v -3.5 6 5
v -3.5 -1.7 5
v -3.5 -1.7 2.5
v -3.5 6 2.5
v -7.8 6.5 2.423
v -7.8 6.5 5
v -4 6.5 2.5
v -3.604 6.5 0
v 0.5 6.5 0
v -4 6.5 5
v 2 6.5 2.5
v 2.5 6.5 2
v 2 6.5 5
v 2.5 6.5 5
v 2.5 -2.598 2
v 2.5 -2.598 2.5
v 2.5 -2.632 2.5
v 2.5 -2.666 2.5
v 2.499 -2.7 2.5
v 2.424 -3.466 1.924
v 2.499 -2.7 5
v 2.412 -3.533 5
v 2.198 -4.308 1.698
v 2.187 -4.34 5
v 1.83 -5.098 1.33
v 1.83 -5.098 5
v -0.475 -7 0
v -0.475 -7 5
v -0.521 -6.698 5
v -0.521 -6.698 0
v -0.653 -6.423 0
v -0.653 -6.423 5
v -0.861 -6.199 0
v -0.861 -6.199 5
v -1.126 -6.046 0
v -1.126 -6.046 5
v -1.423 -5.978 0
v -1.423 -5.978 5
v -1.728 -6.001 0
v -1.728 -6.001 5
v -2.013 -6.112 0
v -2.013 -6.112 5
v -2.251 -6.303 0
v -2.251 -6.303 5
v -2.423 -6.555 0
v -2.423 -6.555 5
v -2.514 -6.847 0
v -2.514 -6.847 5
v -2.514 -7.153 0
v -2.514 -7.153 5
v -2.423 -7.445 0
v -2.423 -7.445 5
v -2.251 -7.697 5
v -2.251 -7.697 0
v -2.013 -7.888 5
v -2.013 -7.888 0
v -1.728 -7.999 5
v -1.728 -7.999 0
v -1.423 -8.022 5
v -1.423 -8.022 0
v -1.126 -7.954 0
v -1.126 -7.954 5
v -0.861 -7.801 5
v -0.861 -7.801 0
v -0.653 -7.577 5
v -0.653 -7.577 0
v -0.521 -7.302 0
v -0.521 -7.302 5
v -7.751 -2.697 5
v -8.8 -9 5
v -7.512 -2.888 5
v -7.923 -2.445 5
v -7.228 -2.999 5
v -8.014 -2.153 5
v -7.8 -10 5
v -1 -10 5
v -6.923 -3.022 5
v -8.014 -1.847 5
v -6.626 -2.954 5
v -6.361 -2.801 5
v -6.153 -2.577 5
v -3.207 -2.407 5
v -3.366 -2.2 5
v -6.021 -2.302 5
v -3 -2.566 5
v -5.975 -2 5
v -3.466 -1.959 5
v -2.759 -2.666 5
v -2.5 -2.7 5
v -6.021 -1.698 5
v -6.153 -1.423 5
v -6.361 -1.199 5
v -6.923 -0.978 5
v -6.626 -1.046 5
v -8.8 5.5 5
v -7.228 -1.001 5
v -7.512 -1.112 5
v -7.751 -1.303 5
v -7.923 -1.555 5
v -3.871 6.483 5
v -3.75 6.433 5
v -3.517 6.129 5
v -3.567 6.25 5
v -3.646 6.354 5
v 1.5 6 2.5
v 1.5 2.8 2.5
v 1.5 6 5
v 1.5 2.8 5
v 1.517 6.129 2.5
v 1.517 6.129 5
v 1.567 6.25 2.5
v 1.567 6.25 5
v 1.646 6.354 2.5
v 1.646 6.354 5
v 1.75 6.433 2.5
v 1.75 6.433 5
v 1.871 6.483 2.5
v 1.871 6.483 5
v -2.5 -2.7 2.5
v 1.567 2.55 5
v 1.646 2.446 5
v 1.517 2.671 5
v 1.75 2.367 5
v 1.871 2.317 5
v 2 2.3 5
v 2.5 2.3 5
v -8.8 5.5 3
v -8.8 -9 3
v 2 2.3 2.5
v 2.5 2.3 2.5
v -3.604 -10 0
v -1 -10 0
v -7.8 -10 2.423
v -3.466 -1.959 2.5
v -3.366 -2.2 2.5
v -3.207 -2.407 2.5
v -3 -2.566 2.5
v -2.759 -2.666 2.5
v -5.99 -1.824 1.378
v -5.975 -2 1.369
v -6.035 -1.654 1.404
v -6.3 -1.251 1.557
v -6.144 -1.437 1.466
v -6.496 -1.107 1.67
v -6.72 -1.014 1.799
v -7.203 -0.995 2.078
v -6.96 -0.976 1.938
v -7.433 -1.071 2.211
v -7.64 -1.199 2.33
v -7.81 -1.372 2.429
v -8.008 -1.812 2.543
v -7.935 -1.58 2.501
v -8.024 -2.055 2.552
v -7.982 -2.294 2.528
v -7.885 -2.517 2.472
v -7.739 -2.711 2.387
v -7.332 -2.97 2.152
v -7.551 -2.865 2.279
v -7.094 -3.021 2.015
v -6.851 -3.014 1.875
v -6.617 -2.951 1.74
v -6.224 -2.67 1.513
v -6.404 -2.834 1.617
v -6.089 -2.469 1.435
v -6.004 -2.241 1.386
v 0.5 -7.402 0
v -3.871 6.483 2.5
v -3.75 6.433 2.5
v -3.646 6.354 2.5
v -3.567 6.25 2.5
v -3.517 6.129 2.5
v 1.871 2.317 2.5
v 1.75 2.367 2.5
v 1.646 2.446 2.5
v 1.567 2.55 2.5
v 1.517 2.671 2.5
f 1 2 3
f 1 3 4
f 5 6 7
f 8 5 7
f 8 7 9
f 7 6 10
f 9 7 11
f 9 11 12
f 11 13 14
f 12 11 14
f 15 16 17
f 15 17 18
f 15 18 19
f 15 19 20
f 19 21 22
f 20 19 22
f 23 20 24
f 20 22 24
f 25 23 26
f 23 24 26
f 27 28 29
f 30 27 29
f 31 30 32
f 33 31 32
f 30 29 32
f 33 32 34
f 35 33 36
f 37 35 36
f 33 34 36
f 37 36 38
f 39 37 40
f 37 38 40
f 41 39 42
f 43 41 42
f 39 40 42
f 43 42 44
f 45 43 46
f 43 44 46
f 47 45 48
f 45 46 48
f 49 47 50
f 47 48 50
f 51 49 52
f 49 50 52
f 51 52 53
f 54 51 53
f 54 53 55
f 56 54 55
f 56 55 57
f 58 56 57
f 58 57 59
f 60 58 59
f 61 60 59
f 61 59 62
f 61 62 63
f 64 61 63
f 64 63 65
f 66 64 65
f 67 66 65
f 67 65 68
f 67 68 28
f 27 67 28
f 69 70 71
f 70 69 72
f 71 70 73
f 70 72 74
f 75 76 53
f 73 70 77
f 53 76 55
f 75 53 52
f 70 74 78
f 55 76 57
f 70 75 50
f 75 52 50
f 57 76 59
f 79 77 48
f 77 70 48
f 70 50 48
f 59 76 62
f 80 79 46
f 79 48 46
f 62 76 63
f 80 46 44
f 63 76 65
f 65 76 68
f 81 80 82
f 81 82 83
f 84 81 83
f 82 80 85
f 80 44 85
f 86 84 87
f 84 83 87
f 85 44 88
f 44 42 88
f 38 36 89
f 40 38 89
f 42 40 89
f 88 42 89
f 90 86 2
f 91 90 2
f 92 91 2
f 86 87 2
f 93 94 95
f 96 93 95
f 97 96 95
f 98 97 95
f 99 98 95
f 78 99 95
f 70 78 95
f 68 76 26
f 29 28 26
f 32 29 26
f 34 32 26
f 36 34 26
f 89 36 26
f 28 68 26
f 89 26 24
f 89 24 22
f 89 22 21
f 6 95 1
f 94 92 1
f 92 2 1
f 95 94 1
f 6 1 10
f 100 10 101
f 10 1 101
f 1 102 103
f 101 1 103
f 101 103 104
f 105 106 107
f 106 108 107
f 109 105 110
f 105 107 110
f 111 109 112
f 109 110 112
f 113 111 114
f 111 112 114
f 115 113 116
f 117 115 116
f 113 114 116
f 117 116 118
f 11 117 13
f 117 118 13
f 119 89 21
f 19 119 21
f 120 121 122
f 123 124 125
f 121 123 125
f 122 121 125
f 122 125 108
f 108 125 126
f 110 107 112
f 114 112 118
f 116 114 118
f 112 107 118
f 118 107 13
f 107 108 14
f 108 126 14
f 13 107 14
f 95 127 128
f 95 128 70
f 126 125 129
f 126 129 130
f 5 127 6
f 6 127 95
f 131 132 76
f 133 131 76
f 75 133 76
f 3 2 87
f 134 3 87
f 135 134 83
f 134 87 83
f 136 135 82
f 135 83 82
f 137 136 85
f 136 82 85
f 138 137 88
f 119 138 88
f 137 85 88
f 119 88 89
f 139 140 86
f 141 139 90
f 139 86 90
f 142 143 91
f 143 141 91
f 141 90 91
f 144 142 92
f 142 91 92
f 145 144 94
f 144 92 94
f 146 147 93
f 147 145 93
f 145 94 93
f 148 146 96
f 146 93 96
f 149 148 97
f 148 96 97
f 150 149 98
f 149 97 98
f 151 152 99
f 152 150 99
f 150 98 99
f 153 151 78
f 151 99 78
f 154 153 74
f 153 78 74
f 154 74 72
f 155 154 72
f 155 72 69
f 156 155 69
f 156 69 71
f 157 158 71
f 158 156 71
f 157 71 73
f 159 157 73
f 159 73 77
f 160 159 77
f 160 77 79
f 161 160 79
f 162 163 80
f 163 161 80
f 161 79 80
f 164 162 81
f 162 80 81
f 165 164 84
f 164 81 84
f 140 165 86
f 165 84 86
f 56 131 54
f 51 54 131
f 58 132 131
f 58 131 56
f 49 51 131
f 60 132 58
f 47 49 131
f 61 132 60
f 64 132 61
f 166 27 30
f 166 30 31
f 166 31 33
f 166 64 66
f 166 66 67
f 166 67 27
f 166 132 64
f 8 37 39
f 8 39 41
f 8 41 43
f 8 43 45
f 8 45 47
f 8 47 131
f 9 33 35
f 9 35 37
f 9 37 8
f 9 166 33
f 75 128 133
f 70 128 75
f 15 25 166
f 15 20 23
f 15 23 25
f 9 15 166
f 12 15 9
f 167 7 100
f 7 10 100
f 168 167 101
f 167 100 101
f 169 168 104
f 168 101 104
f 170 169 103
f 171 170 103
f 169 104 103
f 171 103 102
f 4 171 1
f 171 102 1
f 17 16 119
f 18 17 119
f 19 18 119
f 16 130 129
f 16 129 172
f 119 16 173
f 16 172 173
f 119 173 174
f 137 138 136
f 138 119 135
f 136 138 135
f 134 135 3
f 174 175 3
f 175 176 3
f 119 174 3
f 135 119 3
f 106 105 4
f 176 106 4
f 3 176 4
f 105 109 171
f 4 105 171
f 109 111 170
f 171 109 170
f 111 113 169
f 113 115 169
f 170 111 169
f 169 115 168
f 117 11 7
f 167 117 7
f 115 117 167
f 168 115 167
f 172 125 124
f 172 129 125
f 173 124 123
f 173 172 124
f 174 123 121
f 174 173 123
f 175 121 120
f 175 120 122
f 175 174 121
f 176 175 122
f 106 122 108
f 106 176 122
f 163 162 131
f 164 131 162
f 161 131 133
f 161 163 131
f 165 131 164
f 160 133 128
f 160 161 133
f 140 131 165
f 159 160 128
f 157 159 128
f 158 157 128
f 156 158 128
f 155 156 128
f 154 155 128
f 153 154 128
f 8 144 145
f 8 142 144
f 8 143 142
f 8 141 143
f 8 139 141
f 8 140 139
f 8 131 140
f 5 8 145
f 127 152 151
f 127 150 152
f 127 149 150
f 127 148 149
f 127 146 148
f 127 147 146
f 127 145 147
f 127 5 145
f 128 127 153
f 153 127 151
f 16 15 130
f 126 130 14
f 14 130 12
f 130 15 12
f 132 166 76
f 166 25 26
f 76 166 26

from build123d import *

# Parameters (mm, degrees)
SKETCH_1_W              = 5
SKETCH_1_H              = 20
EXTRUDE_1_DEPTH         = 5
SKETCH1_W               = 5
SKETCH1_H               = 20
EXTRUDE1_DEPTH          = 6.8
M2_5_TAPPED_HOLE1_D     = 2.05
M2_5_TAPPED_HOLE1_DEPTH = 6.35
M2_5_TAPPED_HOLE1_TIP   = 0.615882135
EXTRUDE2_DEPTH          = 2.5
SKETCH3_W               = 11.8
SKETCH3_H               = 3.5
EXTRUDE3_DEPTH          = 5
SKETCH4_W               = 5
SKETCH4_H               = 5
EXTRUDE4_DEPTH          = 2.5
CHAMFER4_SIZE           = 2
SKETCH8_W               = 2
SKETCH8_H               = 5
EXTRUDE6_DEPTH          = 2.5
FILLET1_R               = 0.5
FILLET2_R               = 0.5
CHAMFER6_SIZE           = 3.5
CHAMFER6_SIZE2          = 6.062177826
SKETCH12_W              = 5
SKETCH12_H              = 16.5
EXTRUDE11_DEPTH         = 0.5
EXTRUDE10_REACH         = 21.357
CHAMFER9_SIZE           = 1
FILLET3_R               = 5


with BuildPart() as part:
    # 草图1 → 拉伸1 (new body)
    with BuildSketch(Plane.XY):
        Rectangle(SKETCH_1_W, SKETCH_1_H)
    extrude(amount=EXTRUDE_1_DEPTH)

    # Sketch1 → Extrude1 (add)
    with BuildSketch(Plane.ZY.offset(2.5)):
        with Locations((2.5, 0)):
            Rectangle(SKETCH1_W, SKETCH1_H)
    extrude(amount=EXTRUDE1_DEPTH)

    # M2.5 Tapped Hole1
    with Locations(Plane(origin=(-1.5, -7, 0), x_dir=(-1, 0, 0), z_dir=(0, 0, -1))):
        with Locations((0, 0), (5.5, 5)):
            Hole(M2_5_TAPPED_HOLE1_D / 2, depth=M2_5_TAPPED_HOLE1_DEPTH)
            with Locations((0, 0, -(M2_5_TAPPED_HOLE1_DEPTH + M2_5_TAPPED_HOLE1_TIP / 2))):  # 118° drill point
                Cone(0, M2_5_TAPPED_HOLE1_D / 2, M2_5_TAPPED_HOLE1_TIP, mode=Mode.SUBTRACT)

    # Sketch2 → Extrude2 (cut)
    with BuildSketch(Plane(origin=(0, 0, 5), x_dir=(-1, 0, 0), z_dir=(0, 0, -1))):
        with BuildLine():
            Line((-1.5, -1.7), (-1.5, 5.5))
            ThreePointArc((-1.5, 5.5), (-1.207106781, 6.207106781), (-0.5, 6.5))
            Line((-0.5, 6.5), (2.5, 6.5))
            ThreePointArc((2.5, 6.5), (3.207106781, 6.207106781), (3.5, 5.5))
            Line((3.5, 5.5), (3.5, -1.7))
            ThreePointArc((3.5, -1.7), (3.207106781, -2.407106781), (2.5, -2.7))
            Line((2.5, -2.7), (-0.5, -2.7))
            ThreePointArc((-0.5, -2.7), (-1.207106781, -2.407106781), (-1.5, -1.7))
        make_face()
    extrude(amount=EXTRUDE2_DEPTH, mode=Mode.SUBTRACT)

    # Sketch3 → Extrude3 (cut)
    with BuildSketch(Plane.XY.offset(5)):
        with Locations((-3.4, 8.25)):
            Rectangle(SKETCH3_W, SKETCH3_H)
    extrude(amount=-EXTRUDE3_DEPTH, mode=Mode.SUBTRACT)

    # Sketch4 → Extrude4 (cut)
    with BuildSketch(Plane(origin=(0, 0, 5), x_dir=(-1, 0, 0), z_dir=(0, 0, -1))):
        with Locations((1, 5.5)):
            Rectangle(SKETCH4_W, SKETCH4_H)
    extrude(amount=EXTRUDE4_DEPTH, mode=Mode.SUBTRACT)

    # Chamfer4
    chamfer4_edges = [part.edges().sort_by_distance(p)[0] for p in [
        (2.5, -1.75, 0),
    ]]
    chamfer(chamfer4_edges, length=CHAMFER4_SIZE)

    # Sketch8 → Extrude6 (cut)
    with BuildSketch(Plane.XY.offset(5)):
        with Locations((1.5, -0.2)):
            Rectangle(SKETCH8_W, SKETCH8_H)
    extrude(amount=-EXTRUDE6_DEPTH, mode=Mode.SUBTRACT)

    # Fillet1
    fillet1_edges = [part.edges().sort_by_distance(p)[0] for p in [
        (1.5, 2.3, 3.75),
    ]]
    fillet(fillet1_edges, radius=FILLET1_R)

    # Fillet2
    fillet2_edges = [part.edges().sort_by_distance(p)[0] for p in [
        (-3.5, 6.5, 3.75),
        (1.5, 6.5, 3.75),
    ]]
    fillet(fillet2_edges, radius=FILLET2_R)

    # Chamfer6
    chamfer6_edges = [part.edges().sort_by_distance(p)[0] for p in [
        (2.5, -10, 3.5),
    ]]
    chamfer6_side = [part.faces().sort_by_distance(p)[0] for p in [
        (-3.583625731, -10, 2.564327485),
    ]]
    chamfer(chamfer6_edges, length=CHAMFER6_SIZE, length2=CHAMFER6_SIZE2, reference=chamfer6_side[0])

    # Sketch12 → Extrude11 (cut)
    with BuildSketch(Plane.ZY.offset(9.3)):
        with Locations((2.5, -1.75)):
            Rectangle(SKETCH12_W, SKETCH12_H)
    extrude(amount=-EXTRUDE11_DEPTH, mode=Mode.SUBTRACT)

    # Extrude10: up to this face of the body (flat: up to its plane)
    extrude10_end = Plane(part.part.faces().sort_by_distance((-4.9, -10, 2.5))[0])
    # Sketch13 → Extrude10 (cut, up to the picked face)
    with BuildSketch(Plane(origin=(0, 6.5, 0), x_dir=(1, 0, 0), z_dir=(0, 1, 0)), mode=Mode.PRIVATE) as extrude10_sk1:
        Polygon((-8.8, -3), (-8.8, 0), (-3.603847577, 0), align=None)
    extrude10_tool1 = split(extrude(extrude10_sk1.sketch, amount=-EXTRUDE10_REACH, mode=Mode.PRIVATE), bisect_by=extrude10_end, keep=Keep.BOTH, mode=Mode.PRIVATE)
    add(extrude10_tool1.solids().sort_by(Axis((-7.067949, 6.5, 1), (0, -1, 0)))[0], mode=Mode.SUBTRACT)

    # Chamfer9
    chamfer9_edges = [part.edges().sort_by_distance(p)[0] for p in [
        (-8.8, 6.5, 4),
        (-8.8, -10, 4),
    ]]
    chamfer(chamfer9_edges, length=CHAMFER9_SIZE)

    # Fillet3
    fillet3_edges = [part.edges().sort_by_distance(p)[0] for p in [
        (2.5, -3.937822174, 3.5),
    ]]
    fillet(fillet3_edges, radius=FILLET3_R)


solid = part.part
